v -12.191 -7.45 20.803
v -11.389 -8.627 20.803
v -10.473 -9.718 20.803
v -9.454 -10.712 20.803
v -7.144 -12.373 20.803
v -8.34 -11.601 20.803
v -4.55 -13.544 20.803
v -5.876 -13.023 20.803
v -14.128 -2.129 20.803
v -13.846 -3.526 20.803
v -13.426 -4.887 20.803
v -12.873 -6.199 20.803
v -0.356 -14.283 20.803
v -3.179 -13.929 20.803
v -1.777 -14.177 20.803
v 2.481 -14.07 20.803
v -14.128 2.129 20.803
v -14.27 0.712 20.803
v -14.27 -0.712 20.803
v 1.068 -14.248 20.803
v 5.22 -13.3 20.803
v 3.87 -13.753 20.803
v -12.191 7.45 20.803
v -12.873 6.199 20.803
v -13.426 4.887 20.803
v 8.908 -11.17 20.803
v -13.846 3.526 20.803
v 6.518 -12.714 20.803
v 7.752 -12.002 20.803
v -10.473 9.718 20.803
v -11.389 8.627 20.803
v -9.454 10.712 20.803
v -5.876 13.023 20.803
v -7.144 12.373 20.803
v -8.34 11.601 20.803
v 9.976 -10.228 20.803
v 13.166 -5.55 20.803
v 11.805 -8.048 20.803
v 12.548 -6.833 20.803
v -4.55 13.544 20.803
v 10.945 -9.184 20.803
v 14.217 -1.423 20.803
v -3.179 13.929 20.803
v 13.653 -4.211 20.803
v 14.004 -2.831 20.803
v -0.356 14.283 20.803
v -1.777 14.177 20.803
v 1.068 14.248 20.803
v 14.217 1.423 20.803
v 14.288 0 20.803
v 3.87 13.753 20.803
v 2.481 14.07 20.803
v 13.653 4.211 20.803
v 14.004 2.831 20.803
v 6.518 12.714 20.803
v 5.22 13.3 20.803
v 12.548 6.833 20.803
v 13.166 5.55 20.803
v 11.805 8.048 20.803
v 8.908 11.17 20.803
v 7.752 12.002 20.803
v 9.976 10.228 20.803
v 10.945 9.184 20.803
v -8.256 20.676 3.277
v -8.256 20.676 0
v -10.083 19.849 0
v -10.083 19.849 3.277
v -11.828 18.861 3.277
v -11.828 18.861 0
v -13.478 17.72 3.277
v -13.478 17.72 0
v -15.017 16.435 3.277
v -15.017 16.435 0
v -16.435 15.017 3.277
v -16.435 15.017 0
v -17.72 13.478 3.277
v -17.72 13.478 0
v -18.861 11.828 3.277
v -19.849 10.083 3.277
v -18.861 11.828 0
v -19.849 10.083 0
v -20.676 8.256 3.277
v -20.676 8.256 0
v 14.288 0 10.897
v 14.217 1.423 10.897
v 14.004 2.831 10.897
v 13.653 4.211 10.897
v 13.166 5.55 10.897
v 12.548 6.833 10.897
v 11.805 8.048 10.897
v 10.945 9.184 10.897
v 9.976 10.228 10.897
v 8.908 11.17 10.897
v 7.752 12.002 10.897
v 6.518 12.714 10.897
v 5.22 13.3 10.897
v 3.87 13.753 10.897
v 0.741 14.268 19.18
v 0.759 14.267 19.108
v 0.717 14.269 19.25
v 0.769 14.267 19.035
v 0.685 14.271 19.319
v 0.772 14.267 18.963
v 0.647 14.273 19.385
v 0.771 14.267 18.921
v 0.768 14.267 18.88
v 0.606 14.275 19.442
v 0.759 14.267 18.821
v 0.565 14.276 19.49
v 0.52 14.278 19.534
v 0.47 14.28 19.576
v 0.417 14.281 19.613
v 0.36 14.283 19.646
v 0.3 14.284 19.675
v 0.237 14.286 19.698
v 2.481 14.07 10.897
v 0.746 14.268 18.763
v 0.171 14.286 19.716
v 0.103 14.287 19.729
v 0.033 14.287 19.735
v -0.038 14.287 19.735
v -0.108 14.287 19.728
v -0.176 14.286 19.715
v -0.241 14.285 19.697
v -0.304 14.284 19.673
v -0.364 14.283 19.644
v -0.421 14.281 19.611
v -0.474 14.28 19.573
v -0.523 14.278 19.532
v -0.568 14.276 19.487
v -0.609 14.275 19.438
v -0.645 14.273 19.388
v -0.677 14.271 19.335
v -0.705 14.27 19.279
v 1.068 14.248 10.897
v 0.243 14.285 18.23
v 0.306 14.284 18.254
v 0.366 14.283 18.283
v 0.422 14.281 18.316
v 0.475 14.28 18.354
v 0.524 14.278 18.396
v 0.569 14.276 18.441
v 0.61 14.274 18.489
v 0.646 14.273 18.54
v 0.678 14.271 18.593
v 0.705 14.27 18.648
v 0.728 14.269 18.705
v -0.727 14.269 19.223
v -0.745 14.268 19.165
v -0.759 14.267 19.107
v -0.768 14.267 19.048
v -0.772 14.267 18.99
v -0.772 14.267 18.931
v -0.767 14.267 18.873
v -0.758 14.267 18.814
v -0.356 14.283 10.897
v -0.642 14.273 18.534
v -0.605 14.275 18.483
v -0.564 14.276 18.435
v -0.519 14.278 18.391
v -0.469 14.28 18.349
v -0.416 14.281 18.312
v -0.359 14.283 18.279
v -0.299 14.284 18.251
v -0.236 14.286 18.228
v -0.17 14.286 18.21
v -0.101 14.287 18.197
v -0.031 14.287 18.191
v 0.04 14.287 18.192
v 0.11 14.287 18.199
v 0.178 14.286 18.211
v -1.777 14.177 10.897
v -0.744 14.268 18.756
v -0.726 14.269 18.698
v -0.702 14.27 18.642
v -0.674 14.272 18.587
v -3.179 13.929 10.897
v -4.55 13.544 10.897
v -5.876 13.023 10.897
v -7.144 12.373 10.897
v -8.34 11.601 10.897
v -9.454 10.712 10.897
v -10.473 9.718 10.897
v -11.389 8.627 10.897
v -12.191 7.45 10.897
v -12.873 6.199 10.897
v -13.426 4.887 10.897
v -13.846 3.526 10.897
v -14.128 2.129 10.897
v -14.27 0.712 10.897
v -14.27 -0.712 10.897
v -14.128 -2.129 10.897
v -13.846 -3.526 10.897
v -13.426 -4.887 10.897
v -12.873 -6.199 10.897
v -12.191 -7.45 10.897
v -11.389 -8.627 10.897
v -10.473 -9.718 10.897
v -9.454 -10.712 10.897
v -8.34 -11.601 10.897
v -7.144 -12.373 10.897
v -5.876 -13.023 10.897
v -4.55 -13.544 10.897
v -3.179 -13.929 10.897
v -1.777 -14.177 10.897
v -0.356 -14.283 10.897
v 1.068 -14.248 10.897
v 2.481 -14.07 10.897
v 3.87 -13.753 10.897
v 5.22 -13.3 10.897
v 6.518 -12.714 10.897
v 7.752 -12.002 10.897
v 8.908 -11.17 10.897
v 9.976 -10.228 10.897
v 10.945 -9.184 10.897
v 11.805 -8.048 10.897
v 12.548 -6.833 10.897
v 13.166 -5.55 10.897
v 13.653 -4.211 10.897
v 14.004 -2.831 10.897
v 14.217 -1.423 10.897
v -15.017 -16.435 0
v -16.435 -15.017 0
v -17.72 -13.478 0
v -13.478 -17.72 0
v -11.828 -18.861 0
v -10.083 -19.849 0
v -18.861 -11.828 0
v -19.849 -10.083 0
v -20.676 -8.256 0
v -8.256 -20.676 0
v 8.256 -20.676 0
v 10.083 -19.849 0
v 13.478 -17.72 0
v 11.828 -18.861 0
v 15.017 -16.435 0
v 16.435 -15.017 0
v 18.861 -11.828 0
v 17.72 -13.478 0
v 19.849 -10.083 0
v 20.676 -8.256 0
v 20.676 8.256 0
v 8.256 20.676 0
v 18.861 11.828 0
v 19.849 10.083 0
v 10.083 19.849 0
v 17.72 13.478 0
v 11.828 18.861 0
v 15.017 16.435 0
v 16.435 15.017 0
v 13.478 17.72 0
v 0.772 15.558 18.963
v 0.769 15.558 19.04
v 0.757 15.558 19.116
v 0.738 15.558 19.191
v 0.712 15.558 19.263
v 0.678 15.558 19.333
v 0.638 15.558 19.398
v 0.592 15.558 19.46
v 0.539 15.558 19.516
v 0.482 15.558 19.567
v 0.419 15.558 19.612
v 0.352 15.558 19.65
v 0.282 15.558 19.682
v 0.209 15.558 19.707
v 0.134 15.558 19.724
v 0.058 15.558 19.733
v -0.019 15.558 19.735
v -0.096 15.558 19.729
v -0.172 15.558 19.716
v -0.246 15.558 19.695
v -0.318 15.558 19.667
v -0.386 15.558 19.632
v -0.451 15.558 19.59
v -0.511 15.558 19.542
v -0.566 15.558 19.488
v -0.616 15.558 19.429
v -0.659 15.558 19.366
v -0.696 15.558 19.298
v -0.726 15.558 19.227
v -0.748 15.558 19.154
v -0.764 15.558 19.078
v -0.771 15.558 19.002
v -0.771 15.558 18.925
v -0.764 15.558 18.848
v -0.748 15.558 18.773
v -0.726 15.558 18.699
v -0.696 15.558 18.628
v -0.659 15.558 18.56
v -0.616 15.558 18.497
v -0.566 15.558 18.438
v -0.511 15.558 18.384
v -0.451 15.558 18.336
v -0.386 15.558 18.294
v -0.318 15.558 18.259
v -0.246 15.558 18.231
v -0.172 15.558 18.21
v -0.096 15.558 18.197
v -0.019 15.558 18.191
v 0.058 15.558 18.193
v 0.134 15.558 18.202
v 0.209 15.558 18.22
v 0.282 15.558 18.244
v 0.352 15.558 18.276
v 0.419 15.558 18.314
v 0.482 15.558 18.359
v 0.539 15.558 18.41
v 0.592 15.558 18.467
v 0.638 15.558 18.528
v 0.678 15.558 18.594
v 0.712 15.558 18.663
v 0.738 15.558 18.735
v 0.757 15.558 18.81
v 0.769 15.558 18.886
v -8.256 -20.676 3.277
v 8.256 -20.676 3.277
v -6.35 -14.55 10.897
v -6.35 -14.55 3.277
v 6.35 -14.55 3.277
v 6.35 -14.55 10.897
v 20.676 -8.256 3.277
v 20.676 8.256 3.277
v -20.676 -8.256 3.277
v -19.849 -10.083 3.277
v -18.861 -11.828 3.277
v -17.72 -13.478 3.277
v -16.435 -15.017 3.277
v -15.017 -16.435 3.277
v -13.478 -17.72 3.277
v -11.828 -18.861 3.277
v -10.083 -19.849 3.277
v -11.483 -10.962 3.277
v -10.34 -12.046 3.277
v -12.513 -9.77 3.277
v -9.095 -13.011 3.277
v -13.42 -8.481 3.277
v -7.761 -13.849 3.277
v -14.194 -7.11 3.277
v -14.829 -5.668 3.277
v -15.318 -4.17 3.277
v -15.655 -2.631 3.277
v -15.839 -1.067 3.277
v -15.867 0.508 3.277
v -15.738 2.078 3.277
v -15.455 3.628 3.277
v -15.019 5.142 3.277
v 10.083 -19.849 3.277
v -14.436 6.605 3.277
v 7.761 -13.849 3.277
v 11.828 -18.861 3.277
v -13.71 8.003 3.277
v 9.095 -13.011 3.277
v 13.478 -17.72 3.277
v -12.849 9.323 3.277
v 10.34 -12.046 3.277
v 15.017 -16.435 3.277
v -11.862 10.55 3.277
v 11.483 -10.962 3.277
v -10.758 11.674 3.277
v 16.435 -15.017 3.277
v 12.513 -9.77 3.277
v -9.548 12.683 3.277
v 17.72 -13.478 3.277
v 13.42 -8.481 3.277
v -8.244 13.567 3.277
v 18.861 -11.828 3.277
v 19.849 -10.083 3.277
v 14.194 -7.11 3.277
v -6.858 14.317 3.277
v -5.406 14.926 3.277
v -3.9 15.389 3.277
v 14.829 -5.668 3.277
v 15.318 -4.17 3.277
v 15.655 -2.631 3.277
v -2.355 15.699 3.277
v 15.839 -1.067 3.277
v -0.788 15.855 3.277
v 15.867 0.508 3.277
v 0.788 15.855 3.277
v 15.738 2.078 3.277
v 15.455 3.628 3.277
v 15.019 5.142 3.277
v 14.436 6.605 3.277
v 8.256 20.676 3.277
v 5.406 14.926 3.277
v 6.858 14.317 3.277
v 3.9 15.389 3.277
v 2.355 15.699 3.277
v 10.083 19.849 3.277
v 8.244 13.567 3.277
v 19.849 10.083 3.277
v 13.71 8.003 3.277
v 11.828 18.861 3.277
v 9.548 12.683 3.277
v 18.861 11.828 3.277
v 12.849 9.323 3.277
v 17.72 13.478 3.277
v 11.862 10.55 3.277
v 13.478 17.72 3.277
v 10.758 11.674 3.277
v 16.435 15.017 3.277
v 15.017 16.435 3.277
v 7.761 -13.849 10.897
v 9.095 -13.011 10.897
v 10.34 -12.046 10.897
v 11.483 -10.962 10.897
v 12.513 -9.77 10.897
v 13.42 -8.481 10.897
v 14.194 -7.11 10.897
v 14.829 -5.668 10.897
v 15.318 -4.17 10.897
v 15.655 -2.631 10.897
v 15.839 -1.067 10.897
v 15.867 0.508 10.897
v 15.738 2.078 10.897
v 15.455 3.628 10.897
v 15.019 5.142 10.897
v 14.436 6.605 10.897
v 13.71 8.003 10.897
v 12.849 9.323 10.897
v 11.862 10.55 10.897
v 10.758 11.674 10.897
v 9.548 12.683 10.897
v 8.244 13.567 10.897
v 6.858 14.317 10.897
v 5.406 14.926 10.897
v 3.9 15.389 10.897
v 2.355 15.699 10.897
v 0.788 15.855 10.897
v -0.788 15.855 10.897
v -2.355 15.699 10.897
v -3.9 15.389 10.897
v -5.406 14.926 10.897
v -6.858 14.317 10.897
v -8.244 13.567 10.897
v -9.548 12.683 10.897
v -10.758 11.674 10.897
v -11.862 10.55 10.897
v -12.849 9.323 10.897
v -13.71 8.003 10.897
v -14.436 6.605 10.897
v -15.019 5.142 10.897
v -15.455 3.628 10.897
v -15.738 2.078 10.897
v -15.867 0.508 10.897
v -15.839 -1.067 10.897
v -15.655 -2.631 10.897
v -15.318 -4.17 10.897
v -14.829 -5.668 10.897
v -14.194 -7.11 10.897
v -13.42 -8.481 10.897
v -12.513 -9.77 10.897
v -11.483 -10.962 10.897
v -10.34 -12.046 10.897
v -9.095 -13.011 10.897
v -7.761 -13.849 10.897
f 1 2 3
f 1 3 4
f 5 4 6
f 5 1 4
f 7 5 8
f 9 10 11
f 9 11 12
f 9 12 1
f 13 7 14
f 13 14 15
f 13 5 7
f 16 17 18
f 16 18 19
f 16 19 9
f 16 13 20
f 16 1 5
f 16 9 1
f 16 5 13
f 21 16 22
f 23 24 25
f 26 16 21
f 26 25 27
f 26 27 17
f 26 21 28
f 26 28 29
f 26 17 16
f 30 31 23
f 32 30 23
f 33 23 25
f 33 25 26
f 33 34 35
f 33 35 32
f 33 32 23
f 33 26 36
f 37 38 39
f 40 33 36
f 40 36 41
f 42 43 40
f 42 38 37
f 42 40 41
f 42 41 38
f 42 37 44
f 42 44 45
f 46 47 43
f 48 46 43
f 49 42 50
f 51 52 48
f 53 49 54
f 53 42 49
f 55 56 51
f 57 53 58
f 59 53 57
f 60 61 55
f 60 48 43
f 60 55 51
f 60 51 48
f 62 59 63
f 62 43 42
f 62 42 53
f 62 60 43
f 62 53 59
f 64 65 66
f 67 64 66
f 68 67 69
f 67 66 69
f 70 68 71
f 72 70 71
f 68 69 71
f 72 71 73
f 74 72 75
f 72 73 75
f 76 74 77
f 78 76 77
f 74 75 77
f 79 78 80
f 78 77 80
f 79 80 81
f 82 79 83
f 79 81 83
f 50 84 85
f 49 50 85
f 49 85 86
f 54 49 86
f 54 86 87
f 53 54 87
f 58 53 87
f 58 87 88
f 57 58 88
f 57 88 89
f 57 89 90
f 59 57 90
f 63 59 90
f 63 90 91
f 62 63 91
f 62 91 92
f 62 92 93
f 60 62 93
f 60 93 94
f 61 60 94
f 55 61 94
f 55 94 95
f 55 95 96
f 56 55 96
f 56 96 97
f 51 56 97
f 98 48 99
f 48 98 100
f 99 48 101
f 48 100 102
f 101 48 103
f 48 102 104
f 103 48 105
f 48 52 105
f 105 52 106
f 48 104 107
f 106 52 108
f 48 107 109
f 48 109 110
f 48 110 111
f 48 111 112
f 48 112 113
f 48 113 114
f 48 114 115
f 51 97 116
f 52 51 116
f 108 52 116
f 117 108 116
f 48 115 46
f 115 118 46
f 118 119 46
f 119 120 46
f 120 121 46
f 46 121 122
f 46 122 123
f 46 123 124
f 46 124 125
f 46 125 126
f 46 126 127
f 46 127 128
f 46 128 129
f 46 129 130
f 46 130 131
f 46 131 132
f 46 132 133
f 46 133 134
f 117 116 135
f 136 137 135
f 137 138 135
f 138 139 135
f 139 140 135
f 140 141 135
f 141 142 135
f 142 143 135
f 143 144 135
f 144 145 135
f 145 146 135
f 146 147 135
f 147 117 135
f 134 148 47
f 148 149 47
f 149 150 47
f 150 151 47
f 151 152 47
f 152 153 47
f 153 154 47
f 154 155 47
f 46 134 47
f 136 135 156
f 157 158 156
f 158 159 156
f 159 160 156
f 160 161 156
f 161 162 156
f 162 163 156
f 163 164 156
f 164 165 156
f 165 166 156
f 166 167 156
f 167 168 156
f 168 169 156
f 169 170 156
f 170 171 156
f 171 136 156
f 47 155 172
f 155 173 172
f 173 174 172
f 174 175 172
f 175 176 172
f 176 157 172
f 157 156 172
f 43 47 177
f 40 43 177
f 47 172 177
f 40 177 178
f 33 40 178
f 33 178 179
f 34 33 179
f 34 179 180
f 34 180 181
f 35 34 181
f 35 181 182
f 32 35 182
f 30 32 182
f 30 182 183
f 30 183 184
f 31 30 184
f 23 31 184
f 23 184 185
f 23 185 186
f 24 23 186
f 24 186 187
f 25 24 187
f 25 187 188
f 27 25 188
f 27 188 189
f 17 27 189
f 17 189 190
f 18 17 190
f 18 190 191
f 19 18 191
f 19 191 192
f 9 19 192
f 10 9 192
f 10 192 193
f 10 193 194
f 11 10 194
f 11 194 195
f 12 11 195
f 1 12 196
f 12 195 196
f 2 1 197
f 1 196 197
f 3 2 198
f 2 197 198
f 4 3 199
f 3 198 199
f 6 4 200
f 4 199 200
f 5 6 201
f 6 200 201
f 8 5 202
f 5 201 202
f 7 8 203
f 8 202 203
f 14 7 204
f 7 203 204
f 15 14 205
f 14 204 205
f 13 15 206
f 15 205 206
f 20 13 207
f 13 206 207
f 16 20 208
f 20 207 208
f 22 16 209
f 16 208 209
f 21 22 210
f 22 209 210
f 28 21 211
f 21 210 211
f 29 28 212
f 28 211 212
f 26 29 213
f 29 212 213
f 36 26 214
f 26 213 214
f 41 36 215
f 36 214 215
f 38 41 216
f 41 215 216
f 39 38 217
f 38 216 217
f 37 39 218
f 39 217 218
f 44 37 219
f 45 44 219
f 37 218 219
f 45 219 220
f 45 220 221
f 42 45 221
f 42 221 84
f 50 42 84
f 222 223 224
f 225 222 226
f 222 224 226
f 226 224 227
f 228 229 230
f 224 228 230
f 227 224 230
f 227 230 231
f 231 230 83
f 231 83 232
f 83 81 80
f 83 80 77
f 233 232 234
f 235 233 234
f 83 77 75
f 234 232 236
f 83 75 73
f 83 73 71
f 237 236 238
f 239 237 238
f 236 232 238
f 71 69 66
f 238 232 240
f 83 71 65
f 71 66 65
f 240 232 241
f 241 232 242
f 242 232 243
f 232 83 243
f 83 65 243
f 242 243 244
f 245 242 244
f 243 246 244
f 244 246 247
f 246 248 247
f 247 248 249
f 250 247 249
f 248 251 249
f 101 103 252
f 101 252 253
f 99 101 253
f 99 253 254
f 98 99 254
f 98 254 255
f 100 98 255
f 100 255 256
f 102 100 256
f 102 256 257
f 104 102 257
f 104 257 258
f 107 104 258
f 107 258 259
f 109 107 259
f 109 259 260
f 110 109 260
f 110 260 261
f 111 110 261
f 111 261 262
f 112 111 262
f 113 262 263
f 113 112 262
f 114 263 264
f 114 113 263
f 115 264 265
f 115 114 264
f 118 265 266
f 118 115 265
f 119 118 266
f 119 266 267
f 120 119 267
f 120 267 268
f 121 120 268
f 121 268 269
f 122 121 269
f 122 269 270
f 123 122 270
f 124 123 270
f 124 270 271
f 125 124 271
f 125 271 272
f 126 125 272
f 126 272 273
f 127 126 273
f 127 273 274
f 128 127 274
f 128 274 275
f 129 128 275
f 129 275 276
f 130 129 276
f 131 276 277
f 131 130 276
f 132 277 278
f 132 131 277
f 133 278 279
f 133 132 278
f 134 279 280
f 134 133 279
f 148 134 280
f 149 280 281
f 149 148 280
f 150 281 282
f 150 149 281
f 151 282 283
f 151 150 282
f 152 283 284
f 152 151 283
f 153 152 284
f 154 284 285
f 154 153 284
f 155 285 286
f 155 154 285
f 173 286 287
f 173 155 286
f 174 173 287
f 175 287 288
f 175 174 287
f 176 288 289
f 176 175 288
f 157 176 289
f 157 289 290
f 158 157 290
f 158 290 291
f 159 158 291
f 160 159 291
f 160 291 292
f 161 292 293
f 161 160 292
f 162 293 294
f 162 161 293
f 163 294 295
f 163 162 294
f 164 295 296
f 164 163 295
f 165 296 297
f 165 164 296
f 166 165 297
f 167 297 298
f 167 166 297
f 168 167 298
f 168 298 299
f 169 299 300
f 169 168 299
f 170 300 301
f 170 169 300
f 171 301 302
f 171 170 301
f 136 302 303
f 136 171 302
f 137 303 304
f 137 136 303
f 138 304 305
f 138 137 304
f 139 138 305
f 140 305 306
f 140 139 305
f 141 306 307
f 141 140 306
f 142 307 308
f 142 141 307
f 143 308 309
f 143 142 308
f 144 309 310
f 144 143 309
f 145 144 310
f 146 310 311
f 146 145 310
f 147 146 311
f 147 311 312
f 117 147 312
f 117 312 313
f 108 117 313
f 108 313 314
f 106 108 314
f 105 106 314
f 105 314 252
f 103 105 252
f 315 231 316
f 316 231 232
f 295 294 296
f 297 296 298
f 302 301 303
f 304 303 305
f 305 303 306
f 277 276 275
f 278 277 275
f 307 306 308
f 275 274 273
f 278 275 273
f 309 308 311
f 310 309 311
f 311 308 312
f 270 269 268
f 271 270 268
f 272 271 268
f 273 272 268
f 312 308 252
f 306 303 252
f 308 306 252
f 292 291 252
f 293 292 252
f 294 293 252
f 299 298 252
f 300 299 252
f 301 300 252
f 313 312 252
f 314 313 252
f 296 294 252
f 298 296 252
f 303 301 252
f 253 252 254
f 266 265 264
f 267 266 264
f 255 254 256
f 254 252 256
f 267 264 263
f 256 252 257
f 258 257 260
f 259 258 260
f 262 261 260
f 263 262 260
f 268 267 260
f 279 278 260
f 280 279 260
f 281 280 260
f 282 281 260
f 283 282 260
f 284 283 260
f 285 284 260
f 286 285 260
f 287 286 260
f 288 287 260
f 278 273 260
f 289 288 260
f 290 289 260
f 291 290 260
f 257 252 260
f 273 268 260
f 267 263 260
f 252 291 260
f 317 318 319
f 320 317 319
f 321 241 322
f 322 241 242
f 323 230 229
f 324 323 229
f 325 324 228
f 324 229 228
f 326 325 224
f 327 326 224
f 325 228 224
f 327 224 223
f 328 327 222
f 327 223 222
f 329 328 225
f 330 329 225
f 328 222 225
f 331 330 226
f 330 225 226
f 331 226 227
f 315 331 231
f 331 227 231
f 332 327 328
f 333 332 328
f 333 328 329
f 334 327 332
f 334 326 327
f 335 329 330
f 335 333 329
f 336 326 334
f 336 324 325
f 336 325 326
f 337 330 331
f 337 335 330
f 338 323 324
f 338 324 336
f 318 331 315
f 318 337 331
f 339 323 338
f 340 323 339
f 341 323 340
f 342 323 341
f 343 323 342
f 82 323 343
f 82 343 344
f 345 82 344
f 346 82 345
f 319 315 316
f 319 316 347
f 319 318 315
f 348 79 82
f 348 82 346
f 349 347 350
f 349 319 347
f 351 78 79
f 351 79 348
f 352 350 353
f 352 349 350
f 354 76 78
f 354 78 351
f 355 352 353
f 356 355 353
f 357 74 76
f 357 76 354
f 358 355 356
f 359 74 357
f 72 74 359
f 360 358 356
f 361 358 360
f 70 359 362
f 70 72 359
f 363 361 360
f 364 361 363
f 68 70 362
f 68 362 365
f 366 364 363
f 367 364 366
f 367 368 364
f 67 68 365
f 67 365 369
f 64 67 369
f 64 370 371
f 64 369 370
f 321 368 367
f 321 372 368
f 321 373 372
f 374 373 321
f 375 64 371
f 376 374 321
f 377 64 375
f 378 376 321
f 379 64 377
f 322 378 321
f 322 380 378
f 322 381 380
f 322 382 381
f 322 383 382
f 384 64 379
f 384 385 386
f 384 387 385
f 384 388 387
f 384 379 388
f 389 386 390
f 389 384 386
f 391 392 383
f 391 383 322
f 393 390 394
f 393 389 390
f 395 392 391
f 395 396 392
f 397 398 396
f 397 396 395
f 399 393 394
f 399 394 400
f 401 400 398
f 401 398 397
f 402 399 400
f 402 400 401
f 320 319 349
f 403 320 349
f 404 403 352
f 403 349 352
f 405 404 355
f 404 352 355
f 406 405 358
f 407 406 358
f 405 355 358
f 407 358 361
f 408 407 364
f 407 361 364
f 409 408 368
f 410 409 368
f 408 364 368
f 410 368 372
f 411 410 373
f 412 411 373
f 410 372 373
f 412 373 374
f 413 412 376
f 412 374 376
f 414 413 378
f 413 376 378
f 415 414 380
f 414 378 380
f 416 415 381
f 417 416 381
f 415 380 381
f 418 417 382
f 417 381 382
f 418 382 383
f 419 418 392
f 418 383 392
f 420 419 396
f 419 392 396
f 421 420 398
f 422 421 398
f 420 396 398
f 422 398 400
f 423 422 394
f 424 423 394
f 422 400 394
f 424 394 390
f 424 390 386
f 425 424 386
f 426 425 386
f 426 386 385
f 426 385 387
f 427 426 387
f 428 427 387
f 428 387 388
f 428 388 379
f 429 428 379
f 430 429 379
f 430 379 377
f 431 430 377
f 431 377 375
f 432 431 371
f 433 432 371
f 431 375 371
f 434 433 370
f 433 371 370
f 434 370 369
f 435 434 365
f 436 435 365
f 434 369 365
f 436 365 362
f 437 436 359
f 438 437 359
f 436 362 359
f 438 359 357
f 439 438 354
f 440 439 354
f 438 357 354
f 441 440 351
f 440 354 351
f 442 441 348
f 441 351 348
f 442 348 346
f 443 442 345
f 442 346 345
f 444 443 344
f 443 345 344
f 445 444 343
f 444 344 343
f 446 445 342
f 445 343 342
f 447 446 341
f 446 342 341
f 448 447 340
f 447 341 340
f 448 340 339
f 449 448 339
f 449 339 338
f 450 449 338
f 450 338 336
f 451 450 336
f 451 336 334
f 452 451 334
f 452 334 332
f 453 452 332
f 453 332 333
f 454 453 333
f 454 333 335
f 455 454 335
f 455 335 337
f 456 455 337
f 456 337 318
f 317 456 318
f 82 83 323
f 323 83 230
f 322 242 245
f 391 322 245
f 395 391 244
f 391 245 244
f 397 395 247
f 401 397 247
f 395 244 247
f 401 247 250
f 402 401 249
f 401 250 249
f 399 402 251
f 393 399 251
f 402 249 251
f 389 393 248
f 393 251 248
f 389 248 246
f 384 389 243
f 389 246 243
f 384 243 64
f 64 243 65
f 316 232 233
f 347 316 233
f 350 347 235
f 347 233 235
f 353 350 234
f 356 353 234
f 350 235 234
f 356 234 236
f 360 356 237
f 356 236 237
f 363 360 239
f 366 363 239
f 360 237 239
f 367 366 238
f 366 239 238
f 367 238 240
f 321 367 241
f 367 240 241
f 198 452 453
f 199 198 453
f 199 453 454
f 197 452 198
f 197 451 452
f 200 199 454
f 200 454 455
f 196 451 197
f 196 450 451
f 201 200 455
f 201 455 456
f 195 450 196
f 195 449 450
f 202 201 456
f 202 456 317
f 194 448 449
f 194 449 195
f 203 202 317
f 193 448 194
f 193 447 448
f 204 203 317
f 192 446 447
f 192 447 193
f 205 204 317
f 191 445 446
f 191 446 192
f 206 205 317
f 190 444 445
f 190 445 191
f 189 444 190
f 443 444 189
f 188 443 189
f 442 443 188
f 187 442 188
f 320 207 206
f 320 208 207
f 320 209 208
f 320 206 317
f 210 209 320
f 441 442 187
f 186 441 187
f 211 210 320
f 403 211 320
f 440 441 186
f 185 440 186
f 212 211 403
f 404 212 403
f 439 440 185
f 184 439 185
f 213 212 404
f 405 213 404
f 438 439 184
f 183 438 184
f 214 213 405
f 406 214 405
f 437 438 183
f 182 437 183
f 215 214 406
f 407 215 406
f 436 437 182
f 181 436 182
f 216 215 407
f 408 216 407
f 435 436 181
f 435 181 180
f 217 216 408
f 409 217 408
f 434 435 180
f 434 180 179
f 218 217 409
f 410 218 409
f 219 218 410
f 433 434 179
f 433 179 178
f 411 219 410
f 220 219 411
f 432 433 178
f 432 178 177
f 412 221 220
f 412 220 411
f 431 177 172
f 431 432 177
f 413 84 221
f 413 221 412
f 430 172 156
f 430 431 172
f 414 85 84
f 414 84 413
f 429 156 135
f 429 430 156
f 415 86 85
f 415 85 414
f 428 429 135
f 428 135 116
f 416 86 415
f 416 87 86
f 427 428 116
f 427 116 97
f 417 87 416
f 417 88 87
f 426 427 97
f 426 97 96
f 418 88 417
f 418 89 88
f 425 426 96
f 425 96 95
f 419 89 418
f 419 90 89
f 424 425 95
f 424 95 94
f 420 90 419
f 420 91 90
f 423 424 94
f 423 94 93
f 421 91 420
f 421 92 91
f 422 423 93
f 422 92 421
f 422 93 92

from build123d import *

# Parameters (mm, degrees)
F1_DEPTH = 3.2766
F3_DEPTH = 7.62
F4_R     = 14.2875
F5_DEPTH = 9.906
F6_R     = 0.772384
F7_DEPTH = 15.5575


with BuildPart() as f1:
    # F0 (on Top) → F1 (new body)
    with BuildSketch(Plane.XY):
        with BuildLine():
            Line((8.256221, 20.6756), (-8.256221, 20.6756))
            ThreePointArc((-8.256221, 20.6756), (-15.742389, 15.742389), (-20.6756, 8.256221))
            Line((-20.6756, 8.256221), (-20.6756, -8.256221))
            ThreePointArc((-20.6756, -8.256221), (-15.742389, -15.742389), (-8.256221, -20.6756))
            Line((-8.256221, -20.6756), (8.256221, -20.6756))
            ThreePointArc((8.256221, -20.6756), (15.742389, -15.742389), (20.6756, -8.256221))
            Line((20.6756, -8.256221), (20.6756, 8.256221))
            ThreePointArc((20.6756, 8.256221), (15.742389, 15.742389), (8.256221, 20.6756))
        make_face()
    extrude(amount=F1_DEPTH)

    # F2 (on face) → F3 (join)
    with BuildSketch(Plane.XY.offset(3.2766)):
        with BuildLine():
            Line((-6.35, -14.549678), (6.35, -14.549678))
            ThreePointArc((6.35, -14.549678), (0, 15.875), (-6.35, -14.549678))
        make_face()
    extrude(amount=F3_DEPTH)

    # F4 (on face) → F5 (join)
    with BuildSketch(Plane.XY.offset(10.8966)):
        Circle(F4_R)
    extrude(amount=F5_DEPTH)

    # F6 (on Front) → F7 (join)
    with BuildSketch(Plane.XZ):
        with Locations((0, 18.963106)):
            Circle(F6_R)
    extrude(amount=-F7_DEPTH)


solid = f1.part
